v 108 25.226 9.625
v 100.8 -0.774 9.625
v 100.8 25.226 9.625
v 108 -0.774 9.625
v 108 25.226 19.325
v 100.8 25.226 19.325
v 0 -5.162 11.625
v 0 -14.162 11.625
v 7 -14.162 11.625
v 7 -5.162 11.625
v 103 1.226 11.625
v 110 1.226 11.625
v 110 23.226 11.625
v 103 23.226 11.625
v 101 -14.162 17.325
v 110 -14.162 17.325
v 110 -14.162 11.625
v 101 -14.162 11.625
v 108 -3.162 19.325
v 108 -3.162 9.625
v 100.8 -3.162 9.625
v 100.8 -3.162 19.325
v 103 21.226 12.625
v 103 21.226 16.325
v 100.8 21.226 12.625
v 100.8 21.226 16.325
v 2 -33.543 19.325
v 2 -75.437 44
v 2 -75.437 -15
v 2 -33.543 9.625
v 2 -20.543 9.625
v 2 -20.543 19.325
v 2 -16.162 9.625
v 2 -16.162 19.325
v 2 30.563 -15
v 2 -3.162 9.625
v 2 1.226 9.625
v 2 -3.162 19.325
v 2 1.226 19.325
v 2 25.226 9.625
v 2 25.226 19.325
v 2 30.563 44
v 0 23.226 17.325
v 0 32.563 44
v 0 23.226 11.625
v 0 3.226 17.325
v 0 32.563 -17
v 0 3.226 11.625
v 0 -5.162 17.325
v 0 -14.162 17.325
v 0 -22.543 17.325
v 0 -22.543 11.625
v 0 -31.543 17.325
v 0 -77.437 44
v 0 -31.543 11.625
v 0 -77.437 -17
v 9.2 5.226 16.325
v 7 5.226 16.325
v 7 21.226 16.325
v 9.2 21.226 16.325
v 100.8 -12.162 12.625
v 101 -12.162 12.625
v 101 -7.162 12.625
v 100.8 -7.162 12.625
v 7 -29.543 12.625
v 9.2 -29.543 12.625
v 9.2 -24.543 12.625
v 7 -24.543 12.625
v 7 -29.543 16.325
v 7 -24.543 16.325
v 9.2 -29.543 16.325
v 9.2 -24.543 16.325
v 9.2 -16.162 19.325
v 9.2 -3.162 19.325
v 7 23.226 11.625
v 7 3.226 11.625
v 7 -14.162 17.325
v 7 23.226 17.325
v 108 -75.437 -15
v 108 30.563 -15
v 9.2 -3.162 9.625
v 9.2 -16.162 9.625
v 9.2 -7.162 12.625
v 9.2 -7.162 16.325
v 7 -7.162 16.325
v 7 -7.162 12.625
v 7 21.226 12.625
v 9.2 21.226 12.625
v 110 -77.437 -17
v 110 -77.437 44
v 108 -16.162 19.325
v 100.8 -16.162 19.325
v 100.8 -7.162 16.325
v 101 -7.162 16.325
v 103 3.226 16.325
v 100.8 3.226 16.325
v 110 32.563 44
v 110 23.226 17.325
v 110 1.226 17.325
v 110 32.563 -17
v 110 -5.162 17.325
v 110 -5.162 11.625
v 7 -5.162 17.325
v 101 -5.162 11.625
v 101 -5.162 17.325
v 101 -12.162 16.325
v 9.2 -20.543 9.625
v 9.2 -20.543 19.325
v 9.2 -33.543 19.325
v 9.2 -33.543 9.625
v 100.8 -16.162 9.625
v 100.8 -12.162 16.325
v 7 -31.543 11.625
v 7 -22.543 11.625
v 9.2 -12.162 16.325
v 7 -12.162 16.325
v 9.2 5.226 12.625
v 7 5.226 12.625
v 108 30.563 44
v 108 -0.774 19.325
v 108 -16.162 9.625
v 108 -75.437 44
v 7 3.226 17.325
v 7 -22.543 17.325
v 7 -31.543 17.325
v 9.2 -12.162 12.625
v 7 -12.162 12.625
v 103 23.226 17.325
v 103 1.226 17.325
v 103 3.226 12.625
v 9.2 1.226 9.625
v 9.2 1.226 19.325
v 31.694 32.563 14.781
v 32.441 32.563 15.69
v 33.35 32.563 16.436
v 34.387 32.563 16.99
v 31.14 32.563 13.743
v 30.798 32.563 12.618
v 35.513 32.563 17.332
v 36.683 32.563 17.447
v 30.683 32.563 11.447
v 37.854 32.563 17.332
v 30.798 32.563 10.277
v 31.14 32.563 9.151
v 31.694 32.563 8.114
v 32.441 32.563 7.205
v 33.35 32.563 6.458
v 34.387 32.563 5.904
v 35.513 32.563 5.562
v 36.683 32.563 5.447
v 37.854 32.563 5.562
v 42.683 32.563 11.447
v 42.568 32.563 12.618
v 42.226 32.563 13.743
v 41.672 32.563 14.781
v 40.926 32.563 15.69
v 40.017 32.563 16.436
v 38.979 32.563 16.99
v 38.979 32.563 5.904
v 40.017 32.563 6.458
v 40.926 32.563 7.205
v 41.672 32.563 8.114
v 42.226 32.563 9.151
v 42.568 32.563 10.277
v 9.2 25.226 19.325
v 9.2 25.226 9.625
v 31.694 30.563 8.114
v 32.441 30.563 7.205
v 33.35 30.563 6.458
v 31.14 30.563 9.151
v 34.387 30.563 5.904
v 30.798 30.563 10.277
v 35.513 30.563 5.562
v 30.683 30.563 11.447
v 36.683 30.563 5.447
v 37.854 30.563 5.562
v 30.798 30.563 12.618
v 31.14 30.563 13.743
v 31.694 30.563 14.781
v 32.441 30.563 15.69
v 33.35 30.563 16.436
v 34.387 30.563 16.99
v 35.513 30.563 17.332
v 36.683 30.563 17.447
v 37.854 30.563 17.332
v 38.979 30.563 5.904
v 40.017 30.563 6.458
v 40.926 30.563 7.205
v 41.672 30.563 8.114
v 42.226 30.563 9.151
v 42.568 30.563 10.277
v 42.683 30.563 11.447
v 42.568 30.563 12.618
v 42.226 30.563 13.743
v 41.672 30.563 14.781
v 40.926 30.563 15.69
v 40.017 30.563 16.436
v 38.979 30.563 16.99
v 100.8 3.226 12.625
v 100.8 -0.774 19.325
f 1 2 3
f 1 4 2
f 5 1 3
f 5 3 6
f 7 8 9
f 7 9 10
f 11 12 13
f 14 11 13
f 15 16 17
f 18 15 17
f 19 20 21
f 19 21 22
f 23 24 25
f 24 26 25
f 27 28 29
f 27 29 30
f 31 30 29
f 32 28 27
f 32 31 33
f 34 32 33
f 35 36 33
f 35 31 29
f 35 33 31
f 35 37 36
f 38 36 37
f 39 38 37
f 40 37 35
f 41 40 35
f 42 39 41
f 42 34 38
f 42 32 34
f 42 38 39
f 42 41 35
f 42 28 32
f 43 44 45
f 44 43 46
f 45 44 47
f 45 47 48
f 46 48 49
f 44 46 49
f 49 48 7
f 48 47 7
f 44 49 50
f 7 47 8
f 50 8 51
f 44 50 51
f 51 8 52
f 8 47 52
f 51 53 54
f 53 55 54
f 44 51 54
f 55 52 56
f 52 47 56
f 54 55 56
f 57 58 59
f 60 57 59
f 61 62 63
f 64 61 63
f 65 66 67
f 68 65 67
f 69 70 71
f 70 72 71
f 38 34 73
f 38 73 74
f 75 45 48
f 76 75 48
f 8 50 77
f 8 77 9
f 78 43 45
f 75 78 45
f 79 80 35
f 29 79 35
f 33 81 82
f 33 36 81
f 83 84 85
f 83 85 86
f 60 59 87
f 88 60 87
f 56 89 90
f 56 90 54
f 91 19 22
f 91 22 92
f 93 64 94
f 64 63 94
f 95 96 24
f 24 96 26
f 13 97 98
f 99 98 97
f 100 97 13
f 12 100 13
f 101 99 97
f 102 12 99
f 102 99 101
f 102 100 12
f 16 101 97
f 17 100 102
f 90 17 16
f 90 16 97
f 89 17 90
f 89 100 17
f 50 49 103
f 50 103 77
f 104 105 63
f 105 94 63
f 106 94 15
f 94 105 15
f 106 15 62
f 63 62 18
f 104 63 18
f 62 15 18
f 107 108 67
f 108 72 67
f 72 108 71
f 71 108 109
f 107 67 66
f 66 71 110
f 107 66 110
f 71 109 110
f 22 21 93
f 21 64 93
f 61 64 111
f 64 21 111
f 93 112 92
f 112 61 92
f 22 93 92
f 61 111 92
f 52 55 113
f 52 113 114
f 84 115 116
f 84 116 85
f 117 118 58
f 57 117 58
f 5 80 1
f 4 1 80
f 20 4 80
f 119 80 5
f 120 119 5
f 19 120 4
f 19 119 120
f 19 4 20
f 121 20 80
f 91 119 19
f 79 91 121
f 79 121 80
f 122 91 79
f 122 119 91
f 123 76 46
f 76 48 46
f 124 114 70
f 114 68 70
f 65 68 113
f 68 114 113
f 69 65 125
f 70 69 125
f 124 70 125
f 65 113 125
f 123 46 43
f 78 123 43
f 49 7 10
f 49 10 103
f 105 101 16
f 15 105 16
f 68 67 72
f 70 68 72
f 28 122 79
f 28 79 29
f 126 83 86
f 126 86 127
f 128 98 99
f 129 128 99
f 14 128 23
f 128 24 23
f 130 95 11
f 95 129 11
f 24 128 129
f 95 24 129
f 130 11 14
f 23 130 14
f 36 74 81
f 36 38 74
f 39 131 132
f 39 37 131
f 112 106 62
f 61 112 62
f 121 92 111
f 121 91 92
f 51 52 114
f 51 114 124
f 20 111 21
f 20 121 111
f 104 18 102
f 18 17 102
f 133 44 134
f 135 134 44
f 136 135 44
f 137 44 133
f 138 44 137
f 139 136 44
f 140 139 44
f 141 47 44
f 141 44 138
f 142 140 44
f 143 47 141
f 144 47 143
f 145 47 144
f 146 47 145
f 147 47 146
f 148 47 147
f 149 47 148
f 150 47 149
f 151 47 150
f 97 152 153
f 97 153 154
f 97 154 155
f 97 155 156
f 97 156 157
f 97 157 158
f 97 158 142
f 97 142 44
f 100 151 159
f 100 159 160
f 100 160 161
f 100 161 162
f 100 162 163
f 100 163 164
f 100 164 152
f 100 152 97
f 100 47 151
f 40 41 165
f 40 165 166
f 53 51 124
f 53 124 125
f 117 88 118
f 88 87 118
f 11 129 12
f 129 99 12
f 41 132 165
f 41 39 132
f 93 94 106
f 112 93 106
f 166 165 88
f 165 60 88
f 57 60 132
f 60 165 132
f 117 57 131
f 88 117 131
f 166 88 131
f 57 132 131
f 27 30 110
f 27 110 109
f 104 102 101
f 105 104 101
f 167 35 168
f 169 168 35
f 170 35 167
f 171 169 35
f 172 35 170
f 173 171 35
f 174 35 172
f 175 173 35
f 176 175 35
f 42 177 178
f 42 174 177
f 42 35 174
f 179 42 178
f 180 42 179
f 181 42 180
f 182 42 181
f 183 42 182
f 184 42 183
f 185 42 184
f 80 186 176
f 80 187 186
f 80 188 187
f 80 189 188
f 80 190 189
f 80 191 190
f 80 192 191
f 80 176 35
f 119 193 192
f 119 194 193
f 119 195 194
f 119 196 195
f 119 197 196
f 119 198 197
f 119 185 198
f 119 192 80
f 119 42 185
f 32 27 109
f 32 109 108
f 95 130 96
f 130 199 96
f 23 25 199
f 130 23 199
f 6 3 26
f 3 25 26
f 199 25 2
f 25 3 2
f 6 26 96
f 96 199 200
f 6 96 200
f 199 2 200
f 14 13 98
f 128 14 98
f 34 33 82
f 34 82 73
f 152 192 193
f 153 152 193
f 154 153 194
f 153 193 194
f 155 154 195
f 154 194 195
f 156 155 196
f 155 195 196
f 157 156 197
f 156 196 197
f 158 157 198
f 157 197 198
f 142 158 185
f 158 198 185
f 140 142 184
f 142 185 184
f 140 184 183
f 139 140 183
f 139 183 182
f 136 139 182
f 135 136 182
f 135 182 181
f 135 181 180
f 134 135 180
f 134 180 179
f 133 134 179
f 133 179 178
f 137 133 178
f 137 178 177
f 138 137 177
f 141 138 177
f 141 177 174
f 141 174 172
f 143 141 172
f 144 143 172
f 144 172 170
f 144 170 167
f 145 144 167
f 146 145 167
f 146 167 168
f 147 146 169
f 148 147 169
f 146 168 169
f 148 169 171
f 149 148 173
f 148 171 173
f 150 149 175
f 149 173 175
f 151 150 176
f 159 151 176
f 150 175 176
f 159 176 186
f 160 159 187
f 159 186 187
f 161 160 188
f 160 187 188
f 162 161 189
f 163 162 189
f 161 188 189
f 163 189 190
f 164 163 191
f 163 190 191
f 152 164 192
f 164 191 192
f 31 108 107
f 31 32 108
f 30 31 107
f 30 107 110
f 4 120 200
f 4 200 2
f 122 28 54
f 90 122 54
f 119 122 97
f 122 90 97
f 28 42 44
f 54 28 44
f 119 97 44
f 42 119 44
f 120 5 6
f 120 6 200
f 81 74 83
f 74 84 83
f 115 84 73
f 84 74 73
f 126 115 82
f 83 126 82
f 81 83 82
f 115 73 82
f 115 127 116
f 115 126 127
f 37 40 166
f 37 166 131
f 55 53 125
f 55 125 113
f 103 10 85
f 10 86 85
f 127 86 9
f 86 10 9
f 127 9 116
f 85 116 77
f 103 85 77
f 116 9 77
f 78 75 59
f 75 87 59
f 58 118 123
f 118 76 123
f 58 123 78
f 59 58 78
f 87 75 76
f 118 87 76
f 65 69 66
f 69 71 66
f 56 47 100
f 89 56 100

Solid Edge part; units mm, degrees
sketch "Sketch1" plane through (0, 0, 0) normal (0, 0, 1) x (1, 0, 0)
  line L0 (0, 32.5628) -> (110, 32.5628)
  line L1 (110, 32.5628) -> (110, -77.4372)
  line L2 (110, -77.4372) -> (0, -77.4372)
  line L3 (0, 32.5628) -> (0, -77.4372)
extrude "Protrusion1" add sketch "Sketch1" along normal blind 27
sketch "Sketch2" plane through (55, -22.4372, 27) normal (0, 0, 1) x (1, 0, 0)
  line L0 (-53, -53) -> (53, -53)
  line L1 (53, -53) -> (53, 53)
  line L2 (53, 53) -> (-53, 53)
  line L3 (-53, 53) -> (-53, -53)
extrude "ExtrudedCutout_1" cut sketch "Sketch2" against normal blind 25
sketch "Sketch3" plane through (55, 30.5628, 14.5) normal (0, -1, 0) x (1, 0, 0)
  circle A0 centre (-18.3168, -3.0528) radius 6
extrude "ExtrudedCutout_2" cut sketch "Sketch3" against normal blind 2
sketch "Sketch4" plane through (110, -22.4372, 13.5) normal (1, 0, 0) x (0, 1, 0)
  line L0 (23.663, -1.8749) -> (45.663, -1.8749)
  line L1 (45.663, -1.8749) -> (45.663, 3.8251)
  line L2 (45.663, 3.8251) -> (23.663, 3.8251)
  line L3 (23.663, 3.8251) -> (23.663, -1.8749)
extrude "ExtrudedCutout_3" cut sketch "Sketch4" against normal blind 2
sketch "Sketch5" plane through (108, -22.4372, 14.5) normal (-1, 0, 0) x (0, 0, 1)
  line L0 (2.8251, 47.663) -> (4.8251, 47.663)
  line L1 (4.8251, 47.663) -> (4.8251, 21.663)
  line L2 (4.8251, 21.663) -> (-4.8749, 21.663)
  line L3 (-4.8749, 21.663) -> (-4.8749, 47.663)
  line L4 (-4.8749, 47.663) -> (2.8251, 47.663)
extrude "ExtrudedProtrusion_2" add sketch "Sketch5" along normal blind 7.2
sketch "Sketch6" plane through (110, -22.4372, 13.5) normal (1, 0, 0) x (0, 1, 0)
  line L0 (23.663, 3.8251) -> (45.663, 3.8251)
  line L1 (45.663, 3.8251) -> (45.663, -1.8749)
  line L2 (45.663, -1.8749) -> (23.663, -1.8749)
  line L3 (23.663, -1.8749) -> (23.663, 3.8251)
extrude "ExtrudedCutout_4" cut sketch "Sketch6" against normal blind 7
sketch "Sketch7" plane through (100.8, 12.2258, 14.4751) normal (-1, 0, 0) x (0, -1, 0)
  line L0 (0, -1.85) -> (9, -1.85)
  line L1 (9, -1.85) -> (9, 1.85)
  line L2 (9, 1.85) -> (-9, 1.85)
  line L3 (-9, 1.85) -> (-9, -1.85)
  line L4 (-9, -1.85) -> (0, -1.85)
extrude "ExtrudedCutout_5" cut sketch "Sketch7" against normal blind 26.8721
sketch "Sketch8" plane through (110, -22.4372, 13.5) normal (1, 0, 0) x (0, 1, 0)
  line L0 (8.2756, -1.8749) -> (17.2756, -1.8749)
  line L1 (17.2756, -1.8749) -> (17.2756, 3.8251)
  line L2 (17.2756, 3.8251) -> (8.2756, 3.8251)
  line L3 (8.2756, 3.8251) -> (8.2756, -1.8749)
extrude "ExtrudedCutout_6" cut sketch "Sketch8" against normal blind 30.5101
sketch "Sketch9" plane through (108, -22.4372, 14.5) normal (-1, 0, 0) x (0, -1, 0)
  line L0 (-17.2756, 4.8251) -> (-6.2756, 4.8251)
  line L1 (-6.2756, 4.8251) -> (-6.2756, -4.8749)
  line L2 (-6.2756, -4.8749) -> (-19.2756, -4.8749)
  line L3 (-19.2756, -4.8749) -> (-19.2756, 4.8251)
  line L4 (-19.2756, 4.8251) -> (-17.2756, 4.8251)
extrude "ExtrudedProtrusion_3" add sketch "Sketch9" along normal blind 7.2
sketch "Sketch10" plane through (108, -9.6616, 14.4751) normal (1, 0, 0) x (0, 1, 0)
  line L0 (-2.5, -1.85) -> (0, -1.85)
  line L1 (0, -1.85) -> (2.5, -1.85)
  line L2 (2.5, -1.85) -> (2.5, 1.85)
  line L3 (2.5, 1.85) -> (-2.5, 1.85)
  line L4 (-2.5, 1.85) -> (-2.5, -1.85)
extrude "ExtrudedCutout_8" cut sketch "Sketch10" against normal blind 9.4627
sketch "Sketch11" plane through (108, -9.6616, 14.4751) normal (1, 0, 0) x (0, 1, 0)
  line L0 (-4.5, 2.85) -> (4.5, 2.85)
  line L1 (4.5, 2.85) -> (4.5, -2.85)
  line L2 (4.5, -2.85) -> (-4.5, -2.85)
  line L3 (-4.5, -2.85) -> (-4.5, 2.85)
extrude "ExtrudedCutout_10" cut sketch "Sketch11" against normal blind 7
sketch "Sketch12" plane through (0, -22.4372, 13.5) normal (-1, 0, 0) x (0, -1, 0)
  line L0 (-45.663, 3.8251) -> (-45.663, -1.8749)
  line L1 (-45.663, -1.8749) -> (-25.663, -1.8749)
  line L2 (-25.663, -1.8749) -> (-25.663, 3.8251)
  line L3 (-25.663, 3.8251) -> (-45.663, 3.8251)
extrude "ExtrudedCutout_11" cut sketch "Sketch12" against normal blind 2
sketch "Sketch13" plane through (2, -22.4372, 14.5) normal (1, 0, 0) x (0, 0, -1)
  line L0 (4.8749, 23.663) -> (-4.8251, 23.663)
  line L1 (-4.8251, 23.663) -> (-4.8251, 47.663)
  line L2 (-4.8251, 47.663) -> (4.8749, 47.663)
  line L3 (4.8749, 47.663) -> (4.8749, 23.663)
extrude "ExtrudedProtrusion_4" add sketch "Sketch13" along normal blind 7.2
sketch "Sketch14" plane through (0, -22.4372, 13.5) normal (-1, 0, 0) x (0, -1, 0)
  line L0 (-45.663, -1.8749) -> (-45.663, 3.8251)
  line L1 (-45.663, 3.8251) -> (-25.663, 3.8251)
  line L2 (-25.663, 3.8251) -> (-25.663, -1.8749)
  line L3 (-25.663, -1.8749) -> (-45.663, -1.8749)
extrude "ExtrudedCutout_12" cut sketch "Sketch14" against normal blind 7
sketch "Sketch15" plane through (7, 13.2258, 14.4751) normal (-1, 0, 0) x (0, 0, 1)
  line L0 (1.85, 8) -> (-1.85, 8)
  line L1 (-1.85, 8) -> (-1.85, -8)
  line L2 (-1.85, -8) -> (1.85, -8)
  line L3 (1.85, -8) -> (1.85, 8)
extrude "Cutout1" cut sketch "Sketch15" against normal blind 13.8716
sketch "Sketch16" plane through (2, -22.4372, 14.5) normal (1, 0, 0) x (0, 0, -1)
  line L0 (-4.8251, 19.2756) -> (4.8749, 19.2756)
  line L1 (4.8749, 19.2756) -> (4.8749, 6.2756)
  line L2 (4.8749, 6.2756) -> (-4.8251, 6.2756)
  line L3 (-4.8251, 6.2756) -> (-4.8251, 19.2756)
extrude "ExtrudedProtrusion_7" add sketch "Sketch16" along normal blind 7.2
sketch "Sketch17" plane through (9.2, -9.6616, 14.4751) normal (1, 0, 0) x (0, 0, -1)
  line L0 (-1.85, 2.5) -> (1.85, 2.5)
  line L1 (1.85, 2.5) -> (1.85, -2.5)
  line L2 (1.85, -2.5) -> (-1.85, -2.5)
  line L3 (-1.85, -2.5) -> (-1.85, 2.5)
extrude "ExtrudedCutout_16" cut sketch "Sketch17" against normal blind 15.454
sketch "Sketch18" plane through (0, -22.4372, 13.5) normal (-1, 0, 0) x (0, 0, 1)
  line L0 (-1.8749, 17.2756) -> (3.8251, 17.2756)
  line L1 (3.8251, 17.2756) -> (3.8251, 8.2756)
  line L2 (3.8251, 8.2756) -> (-1.8749, 8.2756)
  line L3 (-1.8749, 8.2756) -> (-1.8749, 17.2756)
extrude "ExtrudedCutout_17" cut sketch "Sketch18" against normal blind 7
sketch "Sketch19" plane through (2, -22.4372, 14.5) normal (1, 0, 0) x (0, 0, -1)
  line L0 (-4.8251, 1.8941) -> (4.8749, 1.8941)
  line L1 (4.8749, 1.8941) -> (4.8749, -11.1059)
  line L2 (4.8749, -11.1059) -> (-4.8251, -11.1059)
  line L3 (-4.8251, -11.1059) -> (-4.8251, 1.8941)
extrude "ExtrudedProtrusion_8" add sketch "Sketch19" along normal blind 7.2
sketch "Sketch20" plane through (9.2, -27.0431, 14.4751) normal (1, 0, 0) x (0, 0, -1)
  line L0 (-1.85, 2.5) -> (-1.85, -2.5)
  line L1 (-1.85, -2.5) -> (1.85, -2.5)
  line L2 (1.85, -2.5) -> (1.85, 2.5)
  line L3 (1.85, 2.5) -> (-1.85, 2.5)
extrude "ExtrudedCutout_18" cut sketch "Sketch20" against normal blind 324.0976
sketch "Sketch21" plane through (0, -22.4372, 13.5) normal (-1, 0, 0) x (0, 0, 1)
  line L0 (-1.8749, -0.1059) -> (3.8251, -0.1059)
  line L1 (3.8251, -0.1059) -> (3.8251, -9.1059)
  line L2 (3.8251, -9.1059) -> (-1.8749, -9.1059)
  line L3 (-1.8749, -9.1059) -> (-1.8749, -0.1059)
extrude "ExtrudedCutout_19" cut sketch "Sketch21" against normal blind 7
sketch "Sketch22" plane through (55, -22.4372, 27) normal (0, 0, 1) x (1, 0, 0)
  line L0 (-55, 55) -> (55, 55)
  line L1 (55, 55) -> (55, -55)
  line L2 (55, -55) -> (-55, -55)
  line L3 (-55, -55) -> (-55, 55)
extrude "ExtrudedProtrusion_9" add sketch "Sketch22" along normal blind 35
sketch "Sketch23" plane through (55, -22.4372, 62) normal (0, 0, 1) x (1, 0, 0)
  line L0 (-53, 53) -> (53, 53)
  line L1 (53, 53) -> (53, -53)
  line L2 (53, -53) -> (-53, -53)
  line L3 (-53, -53) -> (-53, 53)
extrude "Cutout2" cut sketch "Sketch23" against normal blind 35
sketch "Sketch24" plane through (55, -22.4372, 62) normal (0, 0, 1) x (1, 0, 0)
  line L0 (-55, 55) -> (55, 55)
  line L1 (55, 55) -> (55, -55)
  line L2 (55, -55) -> (-55, -55)
  line L3 (-55, -55) -> (-55, 55)
extrude "ExtrudedCutout_21" cut sketch "Sketch24" against normal blind 18
sketch "Sketch25" plane through (55, -22.4372, 0) normal (0, 0, -1) x (-1, 0, 0)
  line L0 (-55, 55) -> (55, 55)
  line L1 (55, 55) -> (55, -55)
  line L2 (55, -55) -> (-55, -55)
  line L3 (-55, -55) -> (-55, 55)
extrude "Protrusion2" add sketch "Sketch25" along normal blind 17
sketch "Sketch26" plane through (55, -22.4372, 2) normal (0, 0, 1) x (-1, 0, 0)
  line L0 (-53, 53) -> (53, 53)
  line L1 (53, 53) -> (53, -53)
  line L2 (53, -53) -> (-53, -53)
  line L3 (-53, -53) -> (-53, 53)
extrude "ExtrudedCutout_22" cut sketch "Sketch26" against normal blind 17
